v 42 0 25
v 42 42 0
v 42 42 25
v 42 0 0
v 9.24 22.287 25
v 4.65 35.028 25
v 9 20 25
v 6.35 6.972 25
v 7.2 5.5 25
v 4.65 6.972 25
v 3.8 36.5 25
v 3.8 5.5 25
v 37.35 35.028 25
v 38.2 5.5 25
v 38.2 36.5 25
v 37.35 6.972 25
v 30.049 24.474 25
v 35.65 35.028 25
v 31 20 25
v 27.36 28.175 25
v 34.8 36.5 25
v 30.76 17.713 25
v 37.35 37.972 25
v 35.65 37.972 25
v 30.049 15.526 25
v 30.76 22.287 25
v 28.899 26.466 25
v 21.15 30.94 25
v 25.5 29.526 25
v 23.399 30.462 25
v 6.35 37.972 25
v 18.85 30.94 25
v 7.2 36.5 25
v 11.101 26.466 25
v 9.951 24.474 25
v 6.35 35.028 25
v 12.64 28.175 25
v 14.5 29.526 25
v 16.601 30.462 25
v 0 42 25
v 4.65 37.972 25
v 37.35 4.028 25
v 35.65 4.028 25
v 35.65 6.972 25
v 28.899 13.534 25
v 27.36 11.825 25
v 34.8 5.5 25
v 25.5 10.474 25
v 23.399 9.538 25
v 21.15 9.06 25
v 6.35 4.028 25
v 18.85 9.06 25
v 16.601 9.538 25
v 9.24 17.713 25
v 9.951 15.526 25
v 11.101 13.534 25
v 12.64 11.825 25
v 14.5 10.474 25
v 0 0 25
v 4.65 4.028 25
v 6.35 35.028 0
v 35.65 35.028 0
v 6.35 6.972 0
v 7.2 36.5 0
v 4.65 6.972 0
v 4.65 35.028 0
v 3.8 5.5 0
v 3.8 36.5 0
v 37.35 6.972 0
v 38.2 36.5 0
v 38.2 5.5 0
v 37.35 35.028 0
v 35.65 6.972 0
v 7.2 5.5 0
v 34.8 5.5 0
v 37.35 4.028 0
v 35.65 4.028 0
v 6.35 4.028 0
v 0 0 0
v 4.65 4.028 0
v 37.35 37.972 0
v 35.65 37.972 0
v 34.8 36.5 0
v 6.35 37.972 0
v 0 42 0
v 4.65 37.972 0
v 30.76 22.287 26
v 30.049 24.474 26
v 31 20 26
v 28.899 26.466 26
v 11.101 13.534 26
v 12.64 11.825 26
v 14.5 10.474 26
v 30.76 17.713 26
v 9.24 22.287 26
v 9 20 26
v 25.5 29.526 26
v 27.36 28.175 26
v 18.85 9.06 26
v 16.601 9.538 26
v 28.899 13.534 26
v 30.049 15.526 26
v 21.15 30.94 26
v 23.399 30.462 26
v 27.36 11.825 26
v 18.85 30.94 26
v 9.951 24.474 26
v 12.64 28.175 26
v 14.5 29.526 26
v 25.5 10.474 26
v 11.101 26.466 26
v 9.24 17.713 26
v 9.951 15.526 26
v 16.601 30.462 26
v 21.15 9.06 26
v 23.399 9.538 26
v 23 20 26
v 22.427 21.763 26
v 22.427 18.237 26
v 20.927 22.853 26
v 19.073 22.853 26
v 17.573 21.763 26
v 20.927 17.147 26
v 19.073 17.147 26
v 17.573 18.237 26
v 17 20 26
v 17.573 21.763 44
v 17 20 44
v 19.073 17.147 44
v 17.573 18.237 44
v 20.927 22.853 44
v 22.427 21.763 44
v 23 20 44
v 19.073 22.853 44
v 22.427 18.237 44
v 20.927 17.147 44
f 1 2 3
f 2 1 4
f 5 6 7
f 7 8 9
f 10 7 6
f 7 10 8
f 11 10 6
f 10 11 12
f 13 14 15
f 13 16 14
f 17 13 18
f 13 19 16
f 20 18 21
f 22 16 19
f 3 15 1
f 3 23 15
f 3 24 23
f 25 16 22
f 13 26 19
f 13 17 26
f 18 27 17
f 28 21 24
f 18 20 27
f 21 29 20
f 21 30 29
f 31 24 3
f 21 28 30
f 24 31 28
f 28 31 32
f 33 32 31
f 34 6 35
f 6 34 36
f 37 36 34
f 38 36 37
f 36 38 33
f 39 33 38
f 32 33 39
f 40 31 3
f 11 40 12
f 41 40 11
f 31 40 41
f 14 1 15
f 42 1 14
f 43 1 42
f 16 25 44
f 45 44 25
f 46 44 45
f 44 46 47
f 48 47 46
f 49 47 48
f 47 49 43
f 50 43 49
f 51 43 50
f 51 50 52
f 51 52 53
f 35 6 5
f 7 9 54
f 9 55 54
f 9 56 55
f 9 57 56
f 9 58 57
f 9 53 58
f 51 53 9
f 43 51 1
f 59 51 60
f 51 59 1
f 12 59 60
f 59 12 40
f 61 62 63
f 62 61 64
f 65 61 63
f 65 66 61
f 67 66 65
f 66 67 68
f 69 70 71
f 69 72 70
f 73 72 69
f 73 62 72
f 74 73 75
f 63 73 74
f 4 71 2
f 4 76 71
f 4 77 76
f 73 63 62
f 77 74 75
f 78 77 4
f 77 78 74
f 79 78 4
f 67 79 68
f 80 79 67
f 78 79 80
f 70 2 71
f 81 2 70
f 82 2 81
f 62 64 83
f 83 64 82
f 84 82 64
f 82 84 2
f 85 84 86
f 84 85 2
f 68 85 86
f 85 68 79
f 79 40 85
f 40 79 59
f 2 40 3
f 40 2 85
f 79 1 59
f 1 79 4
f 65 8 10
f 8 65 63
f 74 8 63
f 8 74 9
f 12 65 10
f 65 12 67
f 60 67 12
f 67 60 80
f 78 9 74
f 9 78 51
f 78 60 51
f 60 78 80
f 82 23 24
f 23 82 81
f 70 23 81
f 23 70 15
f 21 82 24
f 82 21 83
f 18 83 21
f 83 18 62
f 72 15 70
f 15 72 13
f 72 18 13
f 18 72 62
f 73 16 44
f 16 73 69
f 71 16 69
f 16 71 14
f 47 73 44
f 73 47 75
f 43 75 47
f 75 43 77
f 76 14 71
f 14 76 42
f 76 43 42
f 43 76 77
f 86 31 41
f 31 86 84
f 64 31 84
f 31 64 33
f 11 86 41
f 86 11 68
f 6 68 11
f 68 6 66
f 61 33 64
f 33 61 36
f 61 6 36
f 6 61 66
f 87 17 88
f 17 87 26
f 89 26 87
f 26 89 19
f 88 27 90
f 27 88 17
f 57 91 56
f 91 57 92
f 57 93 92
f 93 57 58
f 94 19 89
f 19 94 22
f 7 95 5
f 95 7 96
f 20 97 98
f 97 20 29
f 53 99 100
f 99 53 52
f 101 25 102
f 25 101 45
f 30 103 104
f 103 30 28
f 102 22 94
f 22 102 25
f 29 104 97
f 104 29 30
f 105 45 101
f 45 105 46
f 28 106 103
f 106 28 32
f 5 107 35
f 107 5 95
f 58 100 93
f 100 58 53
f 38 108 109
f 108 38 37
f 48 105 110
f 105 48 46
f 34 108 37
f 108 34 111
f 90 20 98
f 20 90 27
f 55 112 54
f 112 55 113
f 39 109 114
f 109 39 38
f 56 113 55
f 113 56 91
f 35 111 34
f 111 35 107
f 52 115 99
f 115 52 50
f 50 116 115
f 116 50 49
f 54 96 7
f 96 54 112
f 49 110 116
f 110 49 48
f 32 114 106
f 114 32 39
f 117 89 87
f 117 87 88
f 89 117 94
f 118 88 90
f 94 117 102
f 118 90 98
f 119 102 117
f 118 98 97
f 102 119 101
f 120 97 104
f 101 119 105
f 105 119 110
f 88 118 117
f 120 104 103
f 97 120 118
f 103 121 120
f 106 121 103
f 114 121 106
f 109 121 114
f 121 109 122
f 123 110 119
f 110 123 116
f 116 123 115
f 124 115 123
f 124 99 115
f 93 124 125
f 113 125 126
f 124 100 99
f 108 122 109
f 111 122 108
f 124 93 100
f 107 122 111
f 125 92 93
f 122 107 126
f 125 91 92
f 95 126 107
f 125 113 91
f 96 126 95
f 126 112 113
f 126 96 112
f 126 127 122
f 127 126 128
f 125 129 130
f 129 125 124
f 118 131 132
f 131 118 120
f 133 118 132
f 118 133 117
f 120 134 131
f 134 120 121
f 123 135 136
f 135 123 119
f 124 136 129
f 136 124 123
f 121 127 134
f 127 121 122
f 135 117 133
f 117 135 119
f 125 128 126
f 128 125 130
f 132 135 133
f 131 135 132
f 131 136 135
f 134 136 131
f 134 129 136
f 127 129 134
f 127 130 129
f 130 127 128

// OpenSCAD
union () {
difference() {
translate([0,0,0]) {
  color([0.2,0.2,0.2])        
    cube([42,42,25]);
}
translate([5.5,5.5,15]) {
cylinder(h = 40, r1 = 1.7, r2 = 1.7, center = true);
}
translate([36.5,36.5,15]) {
cylinder(h = 40, r1 = 1.7, r2 = 1.7, center = true);
}
translate([36.5,5.5,15]) {
cylinder(h = 40, r1 = 1.7, r2 = 1.7, center = true);
}
translate([5.5,36.5,15]) {
cylinder(h = 40, r1 = 1.7, r2 = 1.7, center = true);
}

}
translate([20,20,25]) {
 color([0.5,0.5,0.5])
cylinder(h = 2, r1 = 11, r2 = 11, center = true);
}
translate([20,20,35]) {
     color([0.5,0.5,0.5])
cylinder(h = 18, r1 = 3, r2 = 3, center = true);
}
}
